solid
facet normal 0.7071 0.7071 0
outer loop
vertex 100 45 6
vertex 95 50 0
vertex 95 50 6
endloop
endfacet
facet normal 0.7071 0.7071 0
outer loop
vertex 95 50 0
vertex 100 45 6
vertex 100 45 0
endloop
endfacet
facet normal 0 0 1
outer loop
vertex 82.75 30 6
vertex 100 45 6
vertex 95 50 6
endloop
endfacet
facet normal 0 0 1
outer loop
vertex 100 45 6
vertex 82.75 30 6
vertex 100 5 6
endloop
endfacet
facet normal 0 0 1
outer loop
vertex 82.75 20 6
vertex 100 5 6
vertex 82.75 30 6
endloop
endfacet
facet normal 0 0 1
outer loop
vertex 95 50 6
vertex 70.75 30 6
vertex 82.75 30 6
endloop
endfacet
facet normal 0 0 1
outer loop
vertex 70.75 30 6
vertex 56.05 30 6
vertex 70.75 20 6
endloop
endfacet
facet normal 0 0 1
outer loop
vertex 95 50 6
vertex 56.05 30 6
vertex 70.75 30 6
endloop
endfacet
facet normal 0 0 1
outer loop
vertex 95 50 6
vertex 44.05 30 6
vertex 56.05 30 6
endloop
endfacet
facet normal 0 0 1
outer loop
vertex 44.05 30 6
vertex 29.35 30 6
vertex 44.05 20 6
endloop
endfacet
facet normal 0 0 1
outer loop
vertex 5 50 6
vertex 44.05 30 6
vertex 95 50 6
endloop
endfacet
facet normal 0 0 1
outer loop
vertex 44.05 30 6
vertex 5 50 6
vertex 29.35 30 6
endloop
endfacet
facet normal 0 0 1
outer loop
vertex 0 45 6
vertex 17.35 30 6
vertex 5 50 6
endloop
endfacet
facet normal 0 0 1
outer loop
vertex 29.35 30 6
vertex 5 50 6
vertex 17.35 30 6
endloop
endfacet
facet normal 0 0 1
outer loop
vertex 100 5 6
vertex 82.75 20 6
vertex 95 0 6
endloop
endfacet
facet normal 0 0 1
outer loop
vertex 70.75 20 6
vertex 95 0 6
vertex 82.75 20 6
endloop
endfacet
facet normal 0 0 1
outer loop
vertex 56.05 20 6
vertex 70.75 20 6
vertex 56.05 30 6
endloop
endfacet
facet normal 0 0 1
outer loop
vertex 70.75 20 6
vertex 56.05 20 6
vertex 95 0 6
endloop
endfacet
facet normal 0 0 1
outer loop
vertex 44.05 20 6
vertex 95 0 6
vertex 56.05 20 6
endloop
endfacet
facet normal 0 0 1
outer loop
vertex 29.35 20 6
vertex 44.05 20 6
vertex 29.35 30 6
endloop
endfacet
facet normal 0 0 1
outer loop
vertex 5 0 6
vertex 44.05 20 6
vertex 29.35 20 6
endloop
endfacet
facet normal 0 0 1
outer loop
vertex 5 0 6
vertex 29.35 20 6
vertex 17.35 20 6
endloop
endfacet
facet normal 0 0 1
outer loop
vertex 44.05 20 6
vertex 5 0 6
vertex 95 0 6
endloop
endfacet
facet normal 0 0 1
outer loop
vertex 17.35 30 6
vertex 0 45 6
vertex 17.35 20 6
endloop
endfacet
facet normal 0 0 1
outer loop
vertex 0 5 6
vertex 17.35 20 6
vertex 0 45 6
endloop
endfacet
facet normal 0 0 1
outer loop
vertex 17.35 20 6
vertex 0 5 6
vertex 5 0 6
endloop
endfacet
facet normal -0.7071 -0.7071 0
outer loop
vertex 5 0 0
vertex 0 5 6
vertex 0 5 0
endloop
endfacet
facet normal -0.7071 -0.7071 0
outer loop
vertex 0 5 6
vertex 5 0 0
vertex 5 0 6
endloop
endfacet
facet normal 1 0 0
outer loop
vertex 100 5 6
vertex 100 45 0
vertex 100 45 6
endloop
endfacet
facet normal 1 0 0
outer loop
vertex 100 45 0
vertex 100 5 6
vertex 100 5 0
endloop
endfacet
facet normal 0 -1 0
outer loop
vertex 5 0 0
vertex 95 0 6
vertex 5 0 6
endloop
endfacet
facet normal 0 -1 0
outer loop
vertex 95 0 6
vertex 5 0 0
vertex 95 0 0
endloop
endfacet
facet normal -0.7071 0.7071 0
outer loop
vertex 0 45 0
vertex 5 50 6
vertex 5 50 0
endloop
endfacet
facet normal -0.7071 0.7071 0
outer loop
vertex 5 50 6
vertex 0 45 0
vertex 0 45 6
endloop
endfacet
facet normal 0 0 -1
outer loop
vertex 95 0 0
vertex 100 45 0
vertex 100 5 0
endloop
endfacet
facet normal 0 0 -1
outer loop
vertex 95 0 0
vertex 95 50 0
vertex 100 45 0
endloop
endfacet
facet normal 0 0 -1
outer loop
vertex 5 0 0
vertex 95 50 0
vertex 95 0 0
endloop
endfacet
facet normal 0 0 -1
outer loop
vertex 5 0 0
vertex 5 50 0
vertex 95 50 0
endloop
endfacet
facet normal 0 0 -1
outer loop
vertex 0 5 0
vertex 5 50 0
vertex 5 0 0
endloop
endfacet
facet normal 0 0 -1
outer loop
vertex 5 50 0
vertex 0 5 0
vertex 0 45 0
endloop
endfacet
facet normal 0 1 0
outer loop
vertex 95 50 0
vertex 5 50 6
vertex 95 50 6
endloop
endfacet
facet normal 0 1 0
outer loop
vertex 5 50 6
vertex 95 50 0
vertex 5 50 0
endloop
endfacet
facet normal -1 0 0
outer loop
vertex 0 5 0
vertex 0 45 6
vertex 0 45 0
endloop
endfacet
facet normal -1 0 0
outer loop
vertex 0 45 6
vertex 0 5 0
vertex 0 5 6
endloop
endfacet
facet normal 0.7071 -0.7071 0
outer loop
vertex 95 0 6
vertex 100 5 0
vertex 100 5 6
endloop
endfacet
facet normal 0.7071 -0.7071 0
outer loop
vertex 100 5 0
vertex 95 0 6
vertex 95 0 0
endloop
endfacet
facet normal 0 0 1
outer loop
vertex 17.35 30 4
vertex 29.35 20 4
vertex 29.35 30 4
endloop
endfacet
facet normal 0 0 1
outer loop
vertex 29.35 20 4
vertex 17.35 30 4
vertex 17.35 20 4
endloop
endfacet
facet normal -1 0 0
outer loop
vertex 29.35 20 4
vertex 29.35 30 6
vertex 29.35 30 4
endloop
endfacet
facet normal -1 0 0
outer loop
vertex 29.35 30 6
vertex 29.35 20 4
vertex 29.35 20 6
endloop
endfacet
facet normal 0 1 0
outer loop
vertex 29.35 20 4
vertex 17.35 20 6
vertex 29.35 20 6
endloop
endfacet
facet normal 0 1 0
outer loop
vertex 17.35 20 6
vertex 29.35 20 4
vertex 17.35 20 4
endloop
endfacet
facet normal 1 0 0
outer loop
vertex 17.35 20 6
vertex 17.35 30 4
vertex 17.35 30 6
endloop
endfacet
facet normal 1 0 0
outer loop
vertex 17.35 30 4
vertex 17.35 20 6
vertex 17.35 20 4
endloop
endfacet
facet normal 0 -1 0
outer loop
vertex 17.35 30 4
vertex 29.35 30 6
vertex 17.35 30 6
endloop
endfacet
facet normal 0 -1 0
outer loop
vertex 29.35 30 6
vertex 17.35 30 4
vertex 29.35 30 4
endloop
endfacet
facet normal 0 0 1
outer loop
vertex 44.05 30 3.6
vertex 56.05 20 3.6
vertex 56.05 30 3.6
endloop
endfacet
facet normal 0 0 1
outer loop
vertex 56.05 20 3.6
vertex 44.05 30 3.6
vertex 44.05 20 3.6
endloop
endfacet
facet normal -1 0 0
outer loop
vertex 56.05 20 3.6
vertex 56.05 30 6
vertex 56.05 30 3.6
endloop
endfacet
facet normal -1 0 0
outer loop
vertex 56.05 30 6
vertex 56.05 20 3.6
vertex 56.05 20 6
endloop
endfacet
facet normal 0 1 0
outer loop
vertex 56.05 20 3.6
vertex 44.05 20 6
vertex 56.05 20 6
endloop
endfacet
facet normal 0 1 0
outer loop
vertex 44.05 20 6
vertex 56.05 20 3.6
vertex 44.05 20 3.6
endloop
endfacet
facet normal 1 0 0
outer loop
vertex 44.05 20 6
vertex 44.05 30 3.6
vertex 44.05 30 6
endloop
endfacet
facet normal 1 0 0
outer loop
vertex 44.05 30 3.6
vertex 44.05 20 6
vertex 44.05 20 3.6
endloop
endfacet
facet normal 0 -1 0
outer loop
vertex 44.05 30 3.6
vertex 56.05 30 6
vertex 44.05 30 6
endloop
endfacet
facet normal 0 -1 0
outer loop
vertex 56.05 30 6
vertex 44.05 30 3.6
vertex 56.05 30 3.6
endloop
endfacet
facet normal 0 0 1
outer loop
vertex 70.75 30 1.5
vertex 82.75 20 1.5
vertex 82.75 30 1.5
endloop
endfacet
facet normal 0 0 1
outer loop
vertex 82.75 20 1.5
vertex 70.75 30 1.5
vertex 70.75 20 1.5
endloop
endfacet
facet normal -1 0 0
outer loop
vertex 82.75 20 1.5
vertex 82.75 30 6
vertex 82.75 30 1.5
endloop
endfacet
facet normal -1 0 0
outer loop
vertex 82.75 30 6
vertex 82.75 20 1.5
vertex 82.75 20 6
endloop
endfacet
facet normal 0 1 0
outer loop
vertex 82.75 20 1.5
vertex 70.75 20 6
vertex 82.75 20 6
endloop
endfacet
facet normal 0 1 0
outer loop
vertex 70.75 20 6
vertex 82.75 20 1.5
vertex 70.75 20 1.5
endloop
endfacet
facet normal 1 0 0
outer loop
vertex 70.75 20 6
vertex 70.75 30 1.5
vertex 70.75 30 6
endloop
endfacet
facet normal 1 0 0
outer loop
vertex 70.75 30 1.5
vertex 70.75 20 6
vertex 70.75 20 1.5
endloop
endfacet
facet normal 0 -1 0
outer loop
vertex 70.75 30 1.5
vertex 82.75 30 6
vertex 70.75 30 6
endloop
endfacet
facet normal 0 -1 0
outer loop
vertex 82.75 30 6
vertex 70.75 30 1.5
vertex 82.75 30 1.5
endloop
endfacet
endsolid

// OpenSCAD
$fn = 32;

// ----------------------------------------------------------------------
// Windowed plate: 3 voids, 100 x 50 x 6 mm
// ----------------------------------------------------------------------

// --- parameters (mm) ---
plate_l = 100;            // plate length, X
plate_w = 50;             // plate width, Y
plate_t = 6;              // plate thickness, Z
edge_margin = 10;         // wall from the plate edge to any window
windows = 3;              // number of windows in the row
win_l = 12;               // window length
win_w = 10;               // window width
win_pitch = 26.7;         // window pitch along X
depth_1 = 2;              // depth of void 1 (full thickness = through)
depth_2 = 2.4;            // depth of void 2 (full thickness = through)
depth_3 = 4.5;            // depth of void 3 (full thickness = through)
corner_c = 5;             // corner chamfer of the plate

profile = [[5, 0], [95, 0], [100, 5], [100, 45], [95, 50], [5, 50], [0, 45], [0, 5]];  // primary outline, 8 points, counter clockwise
void_1 = [[17.35, 20], [29.35, 20], [29.35, 30], [17.35, 30]];  // window 1 of the row, 4 points
void_2 = [[44.05, 20], [56.05, 20], [56.05, 30], [44.05, 30]];  // window 2 of the row, 4 points
void_3 = [[70.75, 20], [82.75, 20], [82.75, 30], [70.75, 30]];  // window 3 of the row, 4 points

// --- the one profile operation ---
difference() {
  linear_extrude(height = plate_t) polygon(points = profile);
  translate([0, 0, plate_t - depth_1])
    linear_extrude(height = depth_1 + 1) polygon(points = void_1);
  translate([0, 0, plate_t - depth_2])
    linear_extrude(height = depth_2 + 1) polygon(points = void_2);
  translate([0, 0, plate_t - depth_3])
    linear_extrude(height = depth_3 + 1) polygon(points = void_3);
}
